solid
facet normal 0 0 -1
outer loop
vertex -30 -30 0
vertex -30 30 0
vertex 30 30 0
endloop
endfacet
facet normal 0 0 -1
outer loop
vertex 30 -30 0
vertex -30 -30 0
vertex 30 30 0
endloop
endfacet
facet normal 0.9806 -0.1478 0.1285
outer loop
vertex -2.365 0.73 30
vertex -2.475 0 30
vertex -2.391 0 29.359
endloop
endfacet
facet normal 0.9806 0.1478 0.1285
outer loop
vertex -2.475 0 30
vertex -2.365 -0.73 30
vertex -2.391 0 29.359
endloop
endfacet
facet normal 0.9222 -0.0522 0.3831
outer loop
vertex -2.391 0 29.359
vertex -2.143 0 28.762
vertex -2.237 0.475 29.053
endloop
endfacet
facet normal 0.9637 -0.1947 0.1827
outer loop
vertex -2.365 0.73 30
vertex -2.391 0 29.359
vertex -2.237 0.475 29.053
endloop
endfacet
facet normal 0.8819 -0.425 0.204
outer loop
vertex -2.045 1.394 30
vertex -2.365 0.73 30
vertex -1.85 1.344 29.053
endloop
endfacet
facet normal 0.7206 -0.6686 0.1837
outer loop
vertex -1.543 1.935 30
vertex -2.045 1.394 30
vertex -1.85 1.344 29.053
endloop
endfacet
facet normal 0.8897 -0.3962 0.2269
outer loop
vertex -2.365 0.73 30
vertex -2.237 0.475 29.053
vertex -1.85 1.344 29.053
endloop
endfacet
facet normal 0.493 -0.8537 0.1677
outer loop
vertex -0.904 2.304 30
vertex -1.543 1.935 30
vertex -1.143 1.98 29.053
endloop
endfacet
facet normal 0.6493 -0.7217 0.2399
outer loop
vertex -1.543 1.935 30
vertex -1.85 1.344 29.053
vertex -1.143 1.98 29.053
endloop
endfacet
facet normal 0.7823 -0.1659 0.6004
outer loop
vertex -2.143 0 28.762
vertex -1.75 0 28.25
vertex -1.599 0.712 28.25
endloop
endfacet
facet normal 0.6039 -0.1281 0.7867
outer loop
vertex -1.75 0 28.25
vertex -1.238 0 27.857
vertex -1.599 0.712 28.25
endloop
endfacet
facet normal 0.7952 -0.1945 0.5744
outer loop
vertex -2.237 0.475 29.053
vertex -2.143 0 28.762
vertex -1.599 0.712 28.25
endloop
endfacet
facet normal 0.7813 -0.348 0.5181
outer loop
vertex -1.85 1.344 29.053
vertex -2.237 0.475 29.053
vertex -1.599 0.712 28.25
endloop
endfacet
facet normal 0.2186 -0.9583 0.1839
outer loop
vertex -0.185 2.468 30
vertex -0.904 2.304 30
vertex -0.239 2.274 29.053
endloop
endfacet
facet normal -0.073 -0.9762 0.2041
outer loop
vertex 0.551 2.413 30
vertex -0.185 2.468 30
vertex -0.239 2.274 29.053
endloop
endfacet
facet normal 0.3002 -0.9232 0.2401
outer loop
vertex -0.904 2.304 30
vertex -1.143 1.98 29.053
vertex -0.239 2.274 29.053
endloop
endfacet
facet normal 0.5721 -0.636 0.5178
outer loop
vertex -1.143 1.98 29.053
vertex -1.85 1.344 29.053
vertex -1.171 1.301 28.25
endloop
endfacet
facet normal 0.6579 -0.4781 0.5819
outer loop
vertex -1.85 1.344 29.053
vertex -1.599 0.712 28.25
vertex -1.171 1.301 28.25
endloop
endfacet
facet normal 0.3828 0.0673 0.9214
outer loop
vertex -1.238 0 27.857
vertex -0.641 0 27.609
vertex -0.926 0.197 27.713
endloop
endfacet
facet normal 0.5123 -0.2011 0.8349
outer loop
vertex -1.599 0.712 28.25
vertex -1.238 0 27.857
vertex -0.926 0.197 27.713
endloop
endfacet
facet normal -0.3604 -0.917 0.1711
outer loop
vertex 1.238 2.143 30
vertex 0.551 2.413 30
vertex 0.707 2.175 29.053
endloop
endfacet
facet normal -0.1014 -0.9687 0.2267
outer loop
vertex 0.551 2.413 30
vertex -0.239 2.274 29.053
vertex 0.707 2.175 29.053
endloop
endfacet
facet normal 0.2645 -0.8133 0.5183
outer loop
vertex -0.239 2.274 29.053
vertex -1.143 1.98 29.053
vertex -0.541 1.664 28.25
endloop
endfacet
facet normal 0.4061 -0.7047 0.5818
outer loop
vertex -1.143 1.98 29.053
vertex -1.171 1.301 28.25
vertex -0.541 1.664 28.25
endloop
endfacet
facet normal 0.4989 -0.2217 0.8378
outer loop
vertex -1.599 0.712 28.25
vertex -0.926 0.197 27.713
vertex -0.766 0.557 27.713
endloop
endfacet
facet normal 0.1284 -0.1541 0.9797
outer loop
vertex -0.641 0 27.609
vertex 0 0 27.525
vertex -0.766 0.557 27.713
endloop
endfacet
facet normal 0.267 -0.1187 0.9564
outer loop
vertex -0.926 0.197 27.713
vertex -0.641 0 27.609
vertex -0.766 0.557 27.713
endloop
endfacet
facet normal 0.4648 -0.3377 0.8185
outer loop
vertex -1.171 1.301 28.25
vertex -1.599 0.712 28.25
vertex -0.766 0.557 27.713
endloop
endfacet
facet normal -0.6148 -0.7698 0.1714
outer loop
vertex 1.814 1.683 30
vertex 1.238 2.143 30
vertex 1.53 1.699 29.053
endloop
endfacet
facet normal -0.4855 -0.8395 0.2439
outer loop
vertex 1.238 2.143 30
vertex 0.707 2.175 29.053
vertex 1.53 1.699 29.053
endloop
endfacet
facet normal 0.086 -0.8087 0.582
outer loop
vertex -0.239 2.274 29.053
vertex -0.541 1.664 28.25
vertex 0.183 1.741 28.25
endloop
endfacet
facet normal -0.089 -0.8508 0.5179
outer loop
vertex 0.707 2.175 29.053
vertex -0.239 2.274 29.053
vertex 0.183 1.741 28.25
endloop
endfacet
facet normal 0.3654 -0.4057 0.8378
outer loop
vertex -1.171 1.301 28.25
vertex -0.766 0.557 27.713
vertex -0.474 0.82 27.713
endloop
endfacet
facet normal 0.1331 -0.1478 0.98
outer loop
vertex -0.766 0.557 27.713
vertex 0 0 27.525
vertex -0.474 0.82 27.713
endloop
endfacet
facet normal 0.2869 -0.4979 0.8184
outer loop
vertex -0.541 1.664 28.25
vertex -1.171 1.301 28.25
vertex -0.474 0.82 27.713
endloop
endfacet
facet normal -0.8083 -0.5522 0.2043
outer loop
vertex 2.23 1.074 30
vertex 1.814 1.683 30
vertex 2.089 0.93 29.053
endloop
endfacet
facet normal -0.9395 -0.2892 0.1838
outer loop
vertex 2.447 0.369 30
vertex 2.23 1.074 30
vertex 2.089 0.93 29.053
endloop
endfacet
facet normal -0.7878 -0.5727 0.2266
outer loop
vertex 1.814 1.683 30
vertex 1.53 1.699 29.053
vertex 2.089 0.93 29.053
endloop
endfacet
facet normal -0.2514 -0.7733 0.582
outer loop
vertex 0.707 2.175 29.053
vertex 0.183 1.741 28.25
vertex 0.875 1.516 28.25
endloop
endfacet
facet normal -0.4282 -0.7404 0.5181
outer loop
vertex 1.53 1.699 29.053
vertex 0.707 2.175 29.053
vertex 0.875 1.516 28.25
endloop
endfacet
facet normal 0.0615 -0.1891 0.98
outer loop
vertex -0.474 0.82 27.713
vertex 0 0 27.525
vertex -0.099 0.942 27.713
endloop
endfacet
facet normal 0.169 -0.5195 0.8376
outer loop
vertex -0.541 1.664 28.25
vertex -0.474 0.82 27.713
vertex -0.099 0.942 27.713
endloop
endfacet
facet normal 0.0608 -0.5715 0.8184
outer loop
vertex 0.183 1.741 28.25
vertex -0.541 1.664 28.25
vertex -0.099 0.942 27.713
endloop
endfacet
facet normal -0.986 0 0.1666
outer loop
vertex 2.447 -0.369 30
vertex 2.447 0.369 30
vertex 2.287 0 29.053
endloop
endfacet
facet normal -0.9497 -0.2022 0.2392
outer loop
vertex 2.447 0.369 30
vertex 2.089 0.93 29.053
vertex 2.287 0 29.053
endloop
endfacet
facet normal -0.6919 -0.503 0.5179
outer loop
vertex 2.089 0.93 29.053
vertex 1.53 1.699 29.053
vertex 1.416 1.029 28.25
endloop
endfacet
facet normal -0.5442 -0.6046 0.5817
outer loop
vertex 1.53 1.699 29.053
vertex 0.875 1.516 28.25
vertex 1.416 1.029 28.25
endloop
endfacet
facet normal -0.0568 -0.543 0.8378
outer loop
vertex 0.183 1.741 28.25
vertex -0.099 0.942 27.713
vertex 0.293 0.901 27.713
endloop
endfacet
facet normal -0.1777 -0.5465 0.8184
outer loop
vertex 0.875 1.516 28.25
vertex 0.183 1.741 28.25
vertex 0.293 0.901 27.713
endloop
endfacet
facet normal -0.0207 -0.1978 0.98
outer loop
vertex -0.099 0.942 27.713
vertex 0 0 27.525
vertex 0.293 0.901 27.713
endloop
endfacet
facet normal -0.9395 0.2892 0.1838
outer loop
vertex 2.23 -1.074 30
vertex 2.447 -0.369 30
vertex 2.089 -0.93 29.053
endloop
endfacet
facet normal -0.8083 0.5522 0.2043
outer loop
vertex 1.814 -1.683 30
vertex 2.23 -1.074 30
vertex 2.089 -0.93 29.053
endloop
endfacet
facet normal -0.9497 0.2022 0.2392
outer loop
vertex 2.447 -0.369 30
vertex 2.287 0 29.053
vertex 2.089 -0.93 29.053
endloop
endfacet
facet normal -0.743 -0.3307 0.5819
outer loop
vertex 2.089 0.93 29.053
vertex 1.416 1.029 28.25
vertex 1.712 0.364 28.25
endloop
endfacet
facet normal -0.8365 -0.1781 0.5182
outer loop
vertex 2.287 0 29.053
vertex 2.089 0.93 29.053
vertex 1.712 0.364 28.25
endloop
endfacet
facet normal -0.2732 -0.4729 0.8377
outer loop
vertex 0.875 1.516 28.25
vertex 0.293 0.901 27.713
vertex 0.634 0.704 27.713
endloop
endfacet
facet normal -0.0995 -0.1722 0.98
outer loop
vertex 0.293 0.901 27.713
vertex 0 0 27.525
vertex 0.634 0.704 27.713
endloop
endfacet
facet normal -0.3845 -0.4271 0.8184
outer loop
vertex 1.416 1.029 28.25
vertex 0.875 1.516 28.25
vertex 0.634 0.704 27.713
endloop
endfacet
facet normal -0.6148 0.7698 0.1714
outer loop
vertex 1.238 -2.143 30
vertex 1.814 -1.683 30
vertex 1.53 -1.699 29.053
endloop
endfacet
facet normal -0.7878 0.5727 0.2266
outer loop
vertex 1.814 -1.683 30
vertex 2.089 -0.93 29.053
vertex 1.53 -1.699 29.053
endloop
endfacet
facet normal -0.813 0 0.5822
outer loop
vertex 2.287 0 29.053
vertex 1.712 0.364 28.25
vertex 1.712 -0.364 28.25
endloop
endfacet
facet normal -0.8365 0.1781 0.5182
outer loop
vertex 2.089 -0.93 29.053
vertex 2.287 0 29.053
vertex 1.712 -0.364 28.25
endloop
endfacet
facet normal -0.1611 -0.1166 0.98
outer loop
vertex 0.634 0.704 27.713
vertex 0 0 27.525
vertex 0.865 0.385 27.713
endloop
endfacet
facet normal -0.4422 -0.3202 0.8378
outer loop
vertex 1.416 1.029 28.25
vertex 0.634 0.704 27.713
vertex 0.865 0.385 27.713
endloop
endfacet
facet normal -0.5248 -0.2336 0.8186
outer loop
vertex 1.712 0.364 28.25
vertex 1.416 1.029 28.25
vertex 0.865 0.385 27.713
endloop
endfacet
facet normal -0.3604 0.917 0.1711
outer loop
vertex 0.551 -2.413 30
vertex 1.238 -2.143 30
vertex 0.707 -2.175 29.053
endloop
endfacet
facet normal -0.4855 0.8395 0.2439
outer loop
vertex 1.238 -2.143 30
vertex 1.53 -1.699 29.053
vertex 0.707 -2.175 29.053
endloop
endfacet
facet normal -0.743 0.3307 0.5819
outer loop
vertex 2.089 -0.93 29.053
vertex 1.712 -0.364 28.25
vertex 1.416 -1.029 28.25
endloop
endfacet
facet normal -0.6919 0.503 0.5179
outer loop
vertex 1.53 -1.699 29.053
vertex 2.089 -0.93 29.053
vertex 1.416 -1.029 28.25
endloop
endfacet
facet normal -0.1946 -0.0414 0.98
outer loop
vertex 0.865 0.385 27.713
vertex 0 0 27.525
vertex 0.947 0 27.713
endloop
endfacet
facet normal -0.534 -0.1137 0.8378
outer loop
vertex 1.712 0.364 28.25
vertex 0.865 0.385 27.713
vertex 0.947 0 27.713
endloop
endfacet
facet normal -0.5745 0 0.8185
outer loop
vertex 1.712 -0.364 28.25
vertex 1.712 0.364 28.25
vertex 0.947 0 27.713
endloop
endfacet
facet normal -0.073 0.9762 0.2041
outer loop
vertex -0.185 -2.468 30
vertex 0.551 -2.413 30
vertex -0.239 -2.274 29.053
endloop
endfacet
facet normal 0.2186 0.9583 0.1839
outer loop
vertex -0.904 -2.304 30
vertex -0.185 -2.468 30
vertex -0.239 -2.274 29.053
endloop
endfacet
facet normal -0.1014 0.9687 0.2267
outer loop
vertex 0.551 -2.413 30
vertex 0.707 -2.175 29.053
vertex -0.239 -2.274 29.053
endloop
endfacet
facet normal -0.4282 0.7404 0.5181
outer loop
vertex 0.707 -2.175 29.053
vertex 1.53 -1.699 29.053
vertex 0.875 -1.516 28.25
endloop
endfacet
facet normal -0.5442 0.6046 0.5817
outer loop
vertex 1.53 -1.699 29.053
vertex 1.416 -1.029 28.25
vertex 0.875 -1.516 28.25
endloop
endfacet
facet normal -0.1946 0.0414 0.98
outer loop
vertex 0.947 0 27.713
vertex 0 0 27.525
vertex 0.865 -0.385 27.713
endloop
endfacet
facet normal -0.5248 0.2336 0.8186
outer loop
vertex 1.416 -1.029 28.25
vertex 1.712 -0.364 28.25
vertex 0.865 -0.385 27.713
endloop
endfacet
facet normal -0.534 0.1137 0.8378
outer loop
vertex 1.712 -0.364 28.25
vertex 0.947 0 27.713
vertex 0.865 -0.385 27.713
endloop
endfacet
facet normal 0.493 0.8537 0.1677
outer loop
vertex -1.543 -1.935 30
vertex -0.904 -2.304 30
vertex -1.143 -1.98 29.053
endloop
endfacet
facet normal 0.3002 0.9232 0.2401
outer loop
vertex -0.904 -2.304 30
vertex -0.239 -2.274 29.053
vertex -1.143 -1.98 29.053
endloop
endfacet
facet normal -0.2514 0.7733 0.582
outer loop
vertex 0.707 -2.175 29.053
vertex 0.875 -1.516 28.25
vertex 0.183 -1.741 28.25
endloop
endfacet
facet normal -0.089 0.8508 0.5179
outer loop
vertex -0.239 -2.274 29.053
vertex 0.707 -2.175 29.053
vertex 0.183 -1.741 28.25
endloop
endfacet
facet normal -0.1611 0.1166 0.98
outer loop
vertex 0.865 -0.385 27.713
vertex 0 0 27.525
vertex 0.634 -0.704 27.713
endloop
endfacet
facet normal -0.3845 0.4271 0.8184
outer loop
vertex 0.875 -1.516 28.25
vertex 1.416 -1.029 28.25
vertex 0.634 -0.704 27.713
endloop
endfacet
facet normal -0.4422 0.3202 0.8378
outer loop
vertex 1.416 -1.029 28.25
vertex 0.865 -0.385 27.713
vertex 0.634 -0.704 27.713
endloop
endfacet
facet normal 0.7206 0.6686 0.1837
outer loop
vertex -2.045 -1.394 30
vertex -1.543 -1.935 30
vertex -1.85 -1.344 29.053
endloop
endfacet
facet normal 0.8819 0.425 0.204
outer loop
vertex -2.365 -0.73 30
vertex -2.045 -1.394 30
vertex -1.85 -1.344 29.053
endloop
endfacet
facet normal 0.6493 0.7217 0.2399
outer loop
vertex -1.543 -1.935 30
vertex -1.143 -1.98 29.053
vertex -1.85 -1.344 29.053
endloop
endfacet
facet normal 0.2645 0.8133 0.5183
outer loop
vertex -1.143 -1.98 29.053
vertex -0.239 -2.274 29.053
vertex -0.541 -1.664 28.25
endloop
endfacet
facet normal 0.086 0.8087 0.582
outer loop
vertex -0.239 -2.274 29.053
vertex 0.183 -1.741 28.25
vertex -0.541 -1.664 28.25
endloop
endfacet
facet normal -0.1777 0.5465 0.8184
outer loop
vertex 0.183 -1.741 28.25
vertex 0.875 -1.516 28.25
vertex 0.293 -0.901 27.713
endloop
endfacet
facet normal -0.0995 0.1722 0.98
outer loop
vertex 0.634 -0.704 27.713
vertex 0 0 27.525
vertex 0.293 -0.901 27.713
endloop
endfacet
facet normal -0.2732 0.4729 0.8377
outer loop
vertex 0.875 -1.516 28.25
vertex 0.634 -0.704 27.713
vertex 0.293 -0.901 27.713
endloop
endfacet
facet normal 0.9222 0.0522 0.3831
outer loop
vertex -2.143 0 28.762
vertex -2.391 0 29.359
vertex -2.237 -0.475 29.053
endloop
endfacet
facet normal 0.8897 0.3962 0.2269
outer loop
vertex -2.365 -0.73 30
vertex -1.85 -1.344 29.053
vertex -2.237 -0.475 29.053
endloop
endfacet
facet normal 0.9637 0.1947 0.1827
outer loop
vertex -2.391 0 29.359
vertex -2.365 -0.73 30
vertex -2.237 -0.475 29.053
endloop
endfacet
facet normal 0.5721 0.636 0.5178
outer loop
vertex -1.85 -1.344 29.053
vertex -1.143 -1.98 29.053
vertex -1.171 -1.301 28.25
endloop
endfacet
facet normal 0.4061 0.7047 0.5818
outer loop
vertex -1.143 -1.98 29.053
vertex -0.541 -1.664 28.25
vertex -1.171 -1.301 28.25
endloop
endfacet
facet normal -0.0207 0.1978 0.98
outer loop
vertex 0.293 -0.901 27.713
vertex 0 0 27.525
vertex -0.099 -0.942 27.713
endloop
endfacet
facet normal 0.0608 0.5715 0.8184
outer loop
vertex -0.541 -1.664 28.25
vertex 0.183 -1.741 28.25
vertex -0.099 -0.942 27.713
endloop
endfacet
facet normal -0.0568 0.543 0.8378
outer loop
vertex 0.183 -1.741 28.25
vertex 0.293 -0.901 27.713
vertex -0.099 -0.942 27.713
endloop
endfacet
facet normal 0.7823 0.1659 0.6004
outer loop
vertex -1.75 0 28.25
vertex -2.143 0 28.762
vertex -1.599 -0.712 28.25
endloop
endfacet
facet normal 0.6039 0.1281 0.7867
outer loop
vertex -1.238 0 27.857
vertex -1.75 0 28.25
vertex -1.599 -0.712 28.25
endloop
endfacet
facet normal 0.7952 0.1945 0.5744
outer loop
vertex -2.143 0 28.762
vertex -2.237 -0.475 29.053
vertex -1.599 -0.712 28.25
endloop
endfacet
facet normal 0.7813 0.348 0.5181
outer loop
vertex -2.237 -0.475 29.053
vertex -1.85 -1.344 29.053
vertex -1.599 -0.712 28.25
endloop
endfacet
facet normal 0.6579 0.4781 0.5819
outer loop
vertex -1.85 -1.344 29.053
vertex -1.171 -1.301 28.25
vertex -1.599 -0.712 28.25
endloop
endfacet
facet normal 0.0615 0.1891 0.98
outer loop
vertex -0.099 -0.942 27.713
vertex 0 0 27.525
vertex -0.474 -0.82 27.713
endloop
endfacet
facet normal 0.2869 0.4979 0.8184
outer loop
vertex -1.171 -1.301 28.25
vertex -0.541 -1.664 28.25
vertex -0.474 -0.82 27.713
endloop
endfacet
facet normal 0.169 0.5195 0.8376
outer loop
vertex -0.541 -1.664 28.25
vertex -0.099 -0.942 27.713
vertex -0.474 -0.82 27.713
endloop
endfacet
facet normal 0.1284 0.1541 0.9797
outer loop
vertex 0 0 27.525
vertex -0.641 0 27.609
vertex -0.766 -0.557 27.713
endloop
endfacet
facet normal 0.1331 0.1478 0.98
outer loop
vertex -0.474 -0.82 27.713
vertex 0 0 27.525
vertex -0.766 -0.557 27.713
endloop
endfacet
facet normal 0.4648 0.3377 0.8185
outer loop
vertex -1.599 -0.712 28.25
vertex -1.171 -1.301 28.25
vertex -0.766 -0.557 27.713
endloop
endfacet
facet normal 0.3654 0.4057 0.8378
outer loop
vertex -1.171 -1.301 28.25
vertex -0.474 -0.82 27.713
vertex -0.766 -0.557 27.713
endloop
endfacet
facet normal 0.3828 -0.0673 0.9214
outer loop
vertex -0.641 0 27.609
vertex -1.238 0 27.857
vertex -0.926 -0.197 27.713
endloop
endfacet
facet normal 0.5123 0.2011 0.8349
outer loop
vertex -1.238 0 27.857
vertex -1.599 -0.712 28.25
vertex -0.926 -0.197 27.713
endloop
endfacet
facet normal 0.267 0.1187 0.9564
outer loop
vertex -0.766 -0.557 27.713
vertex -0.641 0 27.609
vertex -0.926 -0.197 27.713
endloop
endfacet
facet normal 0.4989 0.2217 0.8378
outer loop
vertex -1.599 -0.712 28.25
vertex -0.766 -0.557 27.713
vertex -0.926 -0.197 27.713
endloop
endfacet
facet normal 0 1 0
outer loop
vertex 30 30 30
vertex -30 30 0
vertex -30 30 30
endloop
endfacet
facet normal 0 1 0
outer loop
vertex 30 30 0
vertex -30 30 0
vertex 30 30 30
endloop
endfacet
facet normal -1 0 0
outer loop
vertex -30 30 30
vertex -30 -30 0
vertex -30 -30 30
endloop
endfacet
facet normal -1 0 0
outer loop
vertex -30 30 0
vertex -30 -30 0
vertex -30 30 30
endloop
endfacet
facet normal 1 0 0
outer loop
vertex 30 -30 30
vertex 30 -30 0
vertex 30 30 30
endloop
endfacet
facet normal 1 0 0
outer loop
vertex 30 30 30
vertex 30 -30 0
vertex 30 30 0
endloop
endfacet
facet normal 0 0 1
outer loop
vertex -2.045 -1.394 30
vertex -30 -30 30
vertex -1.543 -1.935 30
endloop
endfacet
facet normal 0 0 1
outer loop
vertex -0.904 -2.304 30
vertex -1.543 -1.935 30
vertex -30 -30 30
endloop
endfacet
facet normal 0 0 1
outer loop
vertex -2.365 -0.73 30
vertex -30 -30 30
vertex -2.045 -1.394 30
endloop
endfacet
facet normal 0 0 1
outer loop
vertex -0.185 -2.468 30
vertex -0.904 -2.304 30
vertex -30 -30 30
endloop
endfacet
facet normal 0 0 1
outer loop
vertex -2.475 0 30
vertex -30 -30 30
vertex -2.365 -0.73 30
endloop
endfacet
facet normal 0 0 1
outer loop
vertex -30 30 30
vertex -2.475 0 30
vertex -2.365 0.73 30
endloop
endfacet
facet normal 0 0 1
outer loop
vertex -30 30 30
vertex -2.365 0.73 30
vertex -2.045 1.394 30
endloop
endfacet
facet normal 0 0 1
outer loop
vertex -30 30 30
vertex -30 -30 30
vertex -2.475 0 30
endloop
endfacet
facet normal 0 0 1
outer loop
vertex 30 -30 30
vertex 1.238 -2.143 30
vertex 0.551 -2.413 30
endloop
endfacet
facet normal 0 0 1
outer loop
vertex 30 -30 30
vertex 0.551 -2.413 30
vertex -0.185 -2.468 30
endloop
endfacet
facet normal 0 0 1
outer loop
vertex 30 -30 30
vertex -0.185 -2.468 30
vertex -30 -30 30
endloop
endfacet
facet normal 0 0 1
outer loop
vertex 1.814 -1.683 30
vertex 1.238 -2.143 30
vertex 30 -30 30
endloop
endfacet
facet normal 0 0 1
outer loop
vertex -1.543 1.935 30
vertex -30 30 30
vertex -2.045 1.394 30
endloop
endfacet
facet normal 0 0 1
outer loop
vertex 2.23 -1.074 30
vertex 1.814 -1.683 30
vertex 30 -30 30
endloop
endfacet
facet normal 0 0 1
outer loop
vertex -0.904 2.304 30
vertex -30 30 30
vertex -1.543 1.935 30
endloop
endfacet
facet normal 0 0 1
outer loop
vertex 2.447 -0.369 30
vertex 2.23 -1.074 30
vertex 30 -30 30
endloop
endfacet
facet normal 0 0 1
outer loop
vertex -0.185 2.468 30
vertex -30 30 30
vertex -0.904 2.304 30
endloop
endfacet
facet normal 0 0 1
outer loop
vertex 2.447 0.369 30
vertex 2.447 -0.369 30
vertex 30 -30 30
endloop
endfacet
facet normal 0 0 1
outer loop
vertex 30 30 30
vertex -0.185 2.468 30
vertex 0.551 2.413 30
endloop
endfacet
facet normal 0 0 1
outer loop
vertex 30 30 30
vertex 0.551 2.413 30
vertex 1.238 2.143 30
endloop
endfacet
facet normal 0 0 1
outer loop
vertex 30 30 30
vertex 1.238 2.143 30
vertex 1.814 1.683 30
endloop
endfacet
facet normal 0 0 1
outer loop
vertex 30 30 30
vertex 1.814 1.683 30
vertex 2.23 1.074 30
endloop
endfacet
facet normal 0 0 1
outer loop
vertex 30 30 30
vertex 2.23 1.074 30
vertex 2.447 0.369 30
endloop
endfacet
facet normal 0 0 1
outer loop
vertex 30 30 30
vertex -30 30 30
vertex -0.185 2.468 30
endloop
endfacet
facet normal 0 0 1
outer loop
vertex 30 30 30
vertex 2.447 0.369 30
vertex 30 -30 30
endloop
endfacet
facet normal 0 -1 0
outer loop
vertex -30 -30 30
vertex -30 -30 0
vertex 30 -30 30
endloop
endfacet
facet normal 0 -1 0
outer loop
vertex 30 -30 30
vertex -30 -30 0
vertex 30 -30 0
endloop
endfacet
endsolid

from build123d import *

# Parameters (mm, degrees)
F0_W     = 60
F0_H     = 60
F1_DEPTH = 30


with BuildPart() as f1:
    # F0 (on Top) → F1 (new body)
    with BuildSketch(Plane.XY):
        Rectangle(F0_W, F0_H)
    extrude(amount=F1_DEPTH)

    # F2 (on Front) → F3 (revolve, cut)
    with BuildSketch(Plane.XZ):
        with BuildLine():
            Line((0, 27.525), (0, 32.475))
            ThreePointArc((0, 32.475), (-2.475, 30), (0, 27.525))
        make_face()
    revolve(axis=Axis((0, 0, 30), (0, 0, -1)), mode=Mode.SUBTRACT)


solid = f1.part
